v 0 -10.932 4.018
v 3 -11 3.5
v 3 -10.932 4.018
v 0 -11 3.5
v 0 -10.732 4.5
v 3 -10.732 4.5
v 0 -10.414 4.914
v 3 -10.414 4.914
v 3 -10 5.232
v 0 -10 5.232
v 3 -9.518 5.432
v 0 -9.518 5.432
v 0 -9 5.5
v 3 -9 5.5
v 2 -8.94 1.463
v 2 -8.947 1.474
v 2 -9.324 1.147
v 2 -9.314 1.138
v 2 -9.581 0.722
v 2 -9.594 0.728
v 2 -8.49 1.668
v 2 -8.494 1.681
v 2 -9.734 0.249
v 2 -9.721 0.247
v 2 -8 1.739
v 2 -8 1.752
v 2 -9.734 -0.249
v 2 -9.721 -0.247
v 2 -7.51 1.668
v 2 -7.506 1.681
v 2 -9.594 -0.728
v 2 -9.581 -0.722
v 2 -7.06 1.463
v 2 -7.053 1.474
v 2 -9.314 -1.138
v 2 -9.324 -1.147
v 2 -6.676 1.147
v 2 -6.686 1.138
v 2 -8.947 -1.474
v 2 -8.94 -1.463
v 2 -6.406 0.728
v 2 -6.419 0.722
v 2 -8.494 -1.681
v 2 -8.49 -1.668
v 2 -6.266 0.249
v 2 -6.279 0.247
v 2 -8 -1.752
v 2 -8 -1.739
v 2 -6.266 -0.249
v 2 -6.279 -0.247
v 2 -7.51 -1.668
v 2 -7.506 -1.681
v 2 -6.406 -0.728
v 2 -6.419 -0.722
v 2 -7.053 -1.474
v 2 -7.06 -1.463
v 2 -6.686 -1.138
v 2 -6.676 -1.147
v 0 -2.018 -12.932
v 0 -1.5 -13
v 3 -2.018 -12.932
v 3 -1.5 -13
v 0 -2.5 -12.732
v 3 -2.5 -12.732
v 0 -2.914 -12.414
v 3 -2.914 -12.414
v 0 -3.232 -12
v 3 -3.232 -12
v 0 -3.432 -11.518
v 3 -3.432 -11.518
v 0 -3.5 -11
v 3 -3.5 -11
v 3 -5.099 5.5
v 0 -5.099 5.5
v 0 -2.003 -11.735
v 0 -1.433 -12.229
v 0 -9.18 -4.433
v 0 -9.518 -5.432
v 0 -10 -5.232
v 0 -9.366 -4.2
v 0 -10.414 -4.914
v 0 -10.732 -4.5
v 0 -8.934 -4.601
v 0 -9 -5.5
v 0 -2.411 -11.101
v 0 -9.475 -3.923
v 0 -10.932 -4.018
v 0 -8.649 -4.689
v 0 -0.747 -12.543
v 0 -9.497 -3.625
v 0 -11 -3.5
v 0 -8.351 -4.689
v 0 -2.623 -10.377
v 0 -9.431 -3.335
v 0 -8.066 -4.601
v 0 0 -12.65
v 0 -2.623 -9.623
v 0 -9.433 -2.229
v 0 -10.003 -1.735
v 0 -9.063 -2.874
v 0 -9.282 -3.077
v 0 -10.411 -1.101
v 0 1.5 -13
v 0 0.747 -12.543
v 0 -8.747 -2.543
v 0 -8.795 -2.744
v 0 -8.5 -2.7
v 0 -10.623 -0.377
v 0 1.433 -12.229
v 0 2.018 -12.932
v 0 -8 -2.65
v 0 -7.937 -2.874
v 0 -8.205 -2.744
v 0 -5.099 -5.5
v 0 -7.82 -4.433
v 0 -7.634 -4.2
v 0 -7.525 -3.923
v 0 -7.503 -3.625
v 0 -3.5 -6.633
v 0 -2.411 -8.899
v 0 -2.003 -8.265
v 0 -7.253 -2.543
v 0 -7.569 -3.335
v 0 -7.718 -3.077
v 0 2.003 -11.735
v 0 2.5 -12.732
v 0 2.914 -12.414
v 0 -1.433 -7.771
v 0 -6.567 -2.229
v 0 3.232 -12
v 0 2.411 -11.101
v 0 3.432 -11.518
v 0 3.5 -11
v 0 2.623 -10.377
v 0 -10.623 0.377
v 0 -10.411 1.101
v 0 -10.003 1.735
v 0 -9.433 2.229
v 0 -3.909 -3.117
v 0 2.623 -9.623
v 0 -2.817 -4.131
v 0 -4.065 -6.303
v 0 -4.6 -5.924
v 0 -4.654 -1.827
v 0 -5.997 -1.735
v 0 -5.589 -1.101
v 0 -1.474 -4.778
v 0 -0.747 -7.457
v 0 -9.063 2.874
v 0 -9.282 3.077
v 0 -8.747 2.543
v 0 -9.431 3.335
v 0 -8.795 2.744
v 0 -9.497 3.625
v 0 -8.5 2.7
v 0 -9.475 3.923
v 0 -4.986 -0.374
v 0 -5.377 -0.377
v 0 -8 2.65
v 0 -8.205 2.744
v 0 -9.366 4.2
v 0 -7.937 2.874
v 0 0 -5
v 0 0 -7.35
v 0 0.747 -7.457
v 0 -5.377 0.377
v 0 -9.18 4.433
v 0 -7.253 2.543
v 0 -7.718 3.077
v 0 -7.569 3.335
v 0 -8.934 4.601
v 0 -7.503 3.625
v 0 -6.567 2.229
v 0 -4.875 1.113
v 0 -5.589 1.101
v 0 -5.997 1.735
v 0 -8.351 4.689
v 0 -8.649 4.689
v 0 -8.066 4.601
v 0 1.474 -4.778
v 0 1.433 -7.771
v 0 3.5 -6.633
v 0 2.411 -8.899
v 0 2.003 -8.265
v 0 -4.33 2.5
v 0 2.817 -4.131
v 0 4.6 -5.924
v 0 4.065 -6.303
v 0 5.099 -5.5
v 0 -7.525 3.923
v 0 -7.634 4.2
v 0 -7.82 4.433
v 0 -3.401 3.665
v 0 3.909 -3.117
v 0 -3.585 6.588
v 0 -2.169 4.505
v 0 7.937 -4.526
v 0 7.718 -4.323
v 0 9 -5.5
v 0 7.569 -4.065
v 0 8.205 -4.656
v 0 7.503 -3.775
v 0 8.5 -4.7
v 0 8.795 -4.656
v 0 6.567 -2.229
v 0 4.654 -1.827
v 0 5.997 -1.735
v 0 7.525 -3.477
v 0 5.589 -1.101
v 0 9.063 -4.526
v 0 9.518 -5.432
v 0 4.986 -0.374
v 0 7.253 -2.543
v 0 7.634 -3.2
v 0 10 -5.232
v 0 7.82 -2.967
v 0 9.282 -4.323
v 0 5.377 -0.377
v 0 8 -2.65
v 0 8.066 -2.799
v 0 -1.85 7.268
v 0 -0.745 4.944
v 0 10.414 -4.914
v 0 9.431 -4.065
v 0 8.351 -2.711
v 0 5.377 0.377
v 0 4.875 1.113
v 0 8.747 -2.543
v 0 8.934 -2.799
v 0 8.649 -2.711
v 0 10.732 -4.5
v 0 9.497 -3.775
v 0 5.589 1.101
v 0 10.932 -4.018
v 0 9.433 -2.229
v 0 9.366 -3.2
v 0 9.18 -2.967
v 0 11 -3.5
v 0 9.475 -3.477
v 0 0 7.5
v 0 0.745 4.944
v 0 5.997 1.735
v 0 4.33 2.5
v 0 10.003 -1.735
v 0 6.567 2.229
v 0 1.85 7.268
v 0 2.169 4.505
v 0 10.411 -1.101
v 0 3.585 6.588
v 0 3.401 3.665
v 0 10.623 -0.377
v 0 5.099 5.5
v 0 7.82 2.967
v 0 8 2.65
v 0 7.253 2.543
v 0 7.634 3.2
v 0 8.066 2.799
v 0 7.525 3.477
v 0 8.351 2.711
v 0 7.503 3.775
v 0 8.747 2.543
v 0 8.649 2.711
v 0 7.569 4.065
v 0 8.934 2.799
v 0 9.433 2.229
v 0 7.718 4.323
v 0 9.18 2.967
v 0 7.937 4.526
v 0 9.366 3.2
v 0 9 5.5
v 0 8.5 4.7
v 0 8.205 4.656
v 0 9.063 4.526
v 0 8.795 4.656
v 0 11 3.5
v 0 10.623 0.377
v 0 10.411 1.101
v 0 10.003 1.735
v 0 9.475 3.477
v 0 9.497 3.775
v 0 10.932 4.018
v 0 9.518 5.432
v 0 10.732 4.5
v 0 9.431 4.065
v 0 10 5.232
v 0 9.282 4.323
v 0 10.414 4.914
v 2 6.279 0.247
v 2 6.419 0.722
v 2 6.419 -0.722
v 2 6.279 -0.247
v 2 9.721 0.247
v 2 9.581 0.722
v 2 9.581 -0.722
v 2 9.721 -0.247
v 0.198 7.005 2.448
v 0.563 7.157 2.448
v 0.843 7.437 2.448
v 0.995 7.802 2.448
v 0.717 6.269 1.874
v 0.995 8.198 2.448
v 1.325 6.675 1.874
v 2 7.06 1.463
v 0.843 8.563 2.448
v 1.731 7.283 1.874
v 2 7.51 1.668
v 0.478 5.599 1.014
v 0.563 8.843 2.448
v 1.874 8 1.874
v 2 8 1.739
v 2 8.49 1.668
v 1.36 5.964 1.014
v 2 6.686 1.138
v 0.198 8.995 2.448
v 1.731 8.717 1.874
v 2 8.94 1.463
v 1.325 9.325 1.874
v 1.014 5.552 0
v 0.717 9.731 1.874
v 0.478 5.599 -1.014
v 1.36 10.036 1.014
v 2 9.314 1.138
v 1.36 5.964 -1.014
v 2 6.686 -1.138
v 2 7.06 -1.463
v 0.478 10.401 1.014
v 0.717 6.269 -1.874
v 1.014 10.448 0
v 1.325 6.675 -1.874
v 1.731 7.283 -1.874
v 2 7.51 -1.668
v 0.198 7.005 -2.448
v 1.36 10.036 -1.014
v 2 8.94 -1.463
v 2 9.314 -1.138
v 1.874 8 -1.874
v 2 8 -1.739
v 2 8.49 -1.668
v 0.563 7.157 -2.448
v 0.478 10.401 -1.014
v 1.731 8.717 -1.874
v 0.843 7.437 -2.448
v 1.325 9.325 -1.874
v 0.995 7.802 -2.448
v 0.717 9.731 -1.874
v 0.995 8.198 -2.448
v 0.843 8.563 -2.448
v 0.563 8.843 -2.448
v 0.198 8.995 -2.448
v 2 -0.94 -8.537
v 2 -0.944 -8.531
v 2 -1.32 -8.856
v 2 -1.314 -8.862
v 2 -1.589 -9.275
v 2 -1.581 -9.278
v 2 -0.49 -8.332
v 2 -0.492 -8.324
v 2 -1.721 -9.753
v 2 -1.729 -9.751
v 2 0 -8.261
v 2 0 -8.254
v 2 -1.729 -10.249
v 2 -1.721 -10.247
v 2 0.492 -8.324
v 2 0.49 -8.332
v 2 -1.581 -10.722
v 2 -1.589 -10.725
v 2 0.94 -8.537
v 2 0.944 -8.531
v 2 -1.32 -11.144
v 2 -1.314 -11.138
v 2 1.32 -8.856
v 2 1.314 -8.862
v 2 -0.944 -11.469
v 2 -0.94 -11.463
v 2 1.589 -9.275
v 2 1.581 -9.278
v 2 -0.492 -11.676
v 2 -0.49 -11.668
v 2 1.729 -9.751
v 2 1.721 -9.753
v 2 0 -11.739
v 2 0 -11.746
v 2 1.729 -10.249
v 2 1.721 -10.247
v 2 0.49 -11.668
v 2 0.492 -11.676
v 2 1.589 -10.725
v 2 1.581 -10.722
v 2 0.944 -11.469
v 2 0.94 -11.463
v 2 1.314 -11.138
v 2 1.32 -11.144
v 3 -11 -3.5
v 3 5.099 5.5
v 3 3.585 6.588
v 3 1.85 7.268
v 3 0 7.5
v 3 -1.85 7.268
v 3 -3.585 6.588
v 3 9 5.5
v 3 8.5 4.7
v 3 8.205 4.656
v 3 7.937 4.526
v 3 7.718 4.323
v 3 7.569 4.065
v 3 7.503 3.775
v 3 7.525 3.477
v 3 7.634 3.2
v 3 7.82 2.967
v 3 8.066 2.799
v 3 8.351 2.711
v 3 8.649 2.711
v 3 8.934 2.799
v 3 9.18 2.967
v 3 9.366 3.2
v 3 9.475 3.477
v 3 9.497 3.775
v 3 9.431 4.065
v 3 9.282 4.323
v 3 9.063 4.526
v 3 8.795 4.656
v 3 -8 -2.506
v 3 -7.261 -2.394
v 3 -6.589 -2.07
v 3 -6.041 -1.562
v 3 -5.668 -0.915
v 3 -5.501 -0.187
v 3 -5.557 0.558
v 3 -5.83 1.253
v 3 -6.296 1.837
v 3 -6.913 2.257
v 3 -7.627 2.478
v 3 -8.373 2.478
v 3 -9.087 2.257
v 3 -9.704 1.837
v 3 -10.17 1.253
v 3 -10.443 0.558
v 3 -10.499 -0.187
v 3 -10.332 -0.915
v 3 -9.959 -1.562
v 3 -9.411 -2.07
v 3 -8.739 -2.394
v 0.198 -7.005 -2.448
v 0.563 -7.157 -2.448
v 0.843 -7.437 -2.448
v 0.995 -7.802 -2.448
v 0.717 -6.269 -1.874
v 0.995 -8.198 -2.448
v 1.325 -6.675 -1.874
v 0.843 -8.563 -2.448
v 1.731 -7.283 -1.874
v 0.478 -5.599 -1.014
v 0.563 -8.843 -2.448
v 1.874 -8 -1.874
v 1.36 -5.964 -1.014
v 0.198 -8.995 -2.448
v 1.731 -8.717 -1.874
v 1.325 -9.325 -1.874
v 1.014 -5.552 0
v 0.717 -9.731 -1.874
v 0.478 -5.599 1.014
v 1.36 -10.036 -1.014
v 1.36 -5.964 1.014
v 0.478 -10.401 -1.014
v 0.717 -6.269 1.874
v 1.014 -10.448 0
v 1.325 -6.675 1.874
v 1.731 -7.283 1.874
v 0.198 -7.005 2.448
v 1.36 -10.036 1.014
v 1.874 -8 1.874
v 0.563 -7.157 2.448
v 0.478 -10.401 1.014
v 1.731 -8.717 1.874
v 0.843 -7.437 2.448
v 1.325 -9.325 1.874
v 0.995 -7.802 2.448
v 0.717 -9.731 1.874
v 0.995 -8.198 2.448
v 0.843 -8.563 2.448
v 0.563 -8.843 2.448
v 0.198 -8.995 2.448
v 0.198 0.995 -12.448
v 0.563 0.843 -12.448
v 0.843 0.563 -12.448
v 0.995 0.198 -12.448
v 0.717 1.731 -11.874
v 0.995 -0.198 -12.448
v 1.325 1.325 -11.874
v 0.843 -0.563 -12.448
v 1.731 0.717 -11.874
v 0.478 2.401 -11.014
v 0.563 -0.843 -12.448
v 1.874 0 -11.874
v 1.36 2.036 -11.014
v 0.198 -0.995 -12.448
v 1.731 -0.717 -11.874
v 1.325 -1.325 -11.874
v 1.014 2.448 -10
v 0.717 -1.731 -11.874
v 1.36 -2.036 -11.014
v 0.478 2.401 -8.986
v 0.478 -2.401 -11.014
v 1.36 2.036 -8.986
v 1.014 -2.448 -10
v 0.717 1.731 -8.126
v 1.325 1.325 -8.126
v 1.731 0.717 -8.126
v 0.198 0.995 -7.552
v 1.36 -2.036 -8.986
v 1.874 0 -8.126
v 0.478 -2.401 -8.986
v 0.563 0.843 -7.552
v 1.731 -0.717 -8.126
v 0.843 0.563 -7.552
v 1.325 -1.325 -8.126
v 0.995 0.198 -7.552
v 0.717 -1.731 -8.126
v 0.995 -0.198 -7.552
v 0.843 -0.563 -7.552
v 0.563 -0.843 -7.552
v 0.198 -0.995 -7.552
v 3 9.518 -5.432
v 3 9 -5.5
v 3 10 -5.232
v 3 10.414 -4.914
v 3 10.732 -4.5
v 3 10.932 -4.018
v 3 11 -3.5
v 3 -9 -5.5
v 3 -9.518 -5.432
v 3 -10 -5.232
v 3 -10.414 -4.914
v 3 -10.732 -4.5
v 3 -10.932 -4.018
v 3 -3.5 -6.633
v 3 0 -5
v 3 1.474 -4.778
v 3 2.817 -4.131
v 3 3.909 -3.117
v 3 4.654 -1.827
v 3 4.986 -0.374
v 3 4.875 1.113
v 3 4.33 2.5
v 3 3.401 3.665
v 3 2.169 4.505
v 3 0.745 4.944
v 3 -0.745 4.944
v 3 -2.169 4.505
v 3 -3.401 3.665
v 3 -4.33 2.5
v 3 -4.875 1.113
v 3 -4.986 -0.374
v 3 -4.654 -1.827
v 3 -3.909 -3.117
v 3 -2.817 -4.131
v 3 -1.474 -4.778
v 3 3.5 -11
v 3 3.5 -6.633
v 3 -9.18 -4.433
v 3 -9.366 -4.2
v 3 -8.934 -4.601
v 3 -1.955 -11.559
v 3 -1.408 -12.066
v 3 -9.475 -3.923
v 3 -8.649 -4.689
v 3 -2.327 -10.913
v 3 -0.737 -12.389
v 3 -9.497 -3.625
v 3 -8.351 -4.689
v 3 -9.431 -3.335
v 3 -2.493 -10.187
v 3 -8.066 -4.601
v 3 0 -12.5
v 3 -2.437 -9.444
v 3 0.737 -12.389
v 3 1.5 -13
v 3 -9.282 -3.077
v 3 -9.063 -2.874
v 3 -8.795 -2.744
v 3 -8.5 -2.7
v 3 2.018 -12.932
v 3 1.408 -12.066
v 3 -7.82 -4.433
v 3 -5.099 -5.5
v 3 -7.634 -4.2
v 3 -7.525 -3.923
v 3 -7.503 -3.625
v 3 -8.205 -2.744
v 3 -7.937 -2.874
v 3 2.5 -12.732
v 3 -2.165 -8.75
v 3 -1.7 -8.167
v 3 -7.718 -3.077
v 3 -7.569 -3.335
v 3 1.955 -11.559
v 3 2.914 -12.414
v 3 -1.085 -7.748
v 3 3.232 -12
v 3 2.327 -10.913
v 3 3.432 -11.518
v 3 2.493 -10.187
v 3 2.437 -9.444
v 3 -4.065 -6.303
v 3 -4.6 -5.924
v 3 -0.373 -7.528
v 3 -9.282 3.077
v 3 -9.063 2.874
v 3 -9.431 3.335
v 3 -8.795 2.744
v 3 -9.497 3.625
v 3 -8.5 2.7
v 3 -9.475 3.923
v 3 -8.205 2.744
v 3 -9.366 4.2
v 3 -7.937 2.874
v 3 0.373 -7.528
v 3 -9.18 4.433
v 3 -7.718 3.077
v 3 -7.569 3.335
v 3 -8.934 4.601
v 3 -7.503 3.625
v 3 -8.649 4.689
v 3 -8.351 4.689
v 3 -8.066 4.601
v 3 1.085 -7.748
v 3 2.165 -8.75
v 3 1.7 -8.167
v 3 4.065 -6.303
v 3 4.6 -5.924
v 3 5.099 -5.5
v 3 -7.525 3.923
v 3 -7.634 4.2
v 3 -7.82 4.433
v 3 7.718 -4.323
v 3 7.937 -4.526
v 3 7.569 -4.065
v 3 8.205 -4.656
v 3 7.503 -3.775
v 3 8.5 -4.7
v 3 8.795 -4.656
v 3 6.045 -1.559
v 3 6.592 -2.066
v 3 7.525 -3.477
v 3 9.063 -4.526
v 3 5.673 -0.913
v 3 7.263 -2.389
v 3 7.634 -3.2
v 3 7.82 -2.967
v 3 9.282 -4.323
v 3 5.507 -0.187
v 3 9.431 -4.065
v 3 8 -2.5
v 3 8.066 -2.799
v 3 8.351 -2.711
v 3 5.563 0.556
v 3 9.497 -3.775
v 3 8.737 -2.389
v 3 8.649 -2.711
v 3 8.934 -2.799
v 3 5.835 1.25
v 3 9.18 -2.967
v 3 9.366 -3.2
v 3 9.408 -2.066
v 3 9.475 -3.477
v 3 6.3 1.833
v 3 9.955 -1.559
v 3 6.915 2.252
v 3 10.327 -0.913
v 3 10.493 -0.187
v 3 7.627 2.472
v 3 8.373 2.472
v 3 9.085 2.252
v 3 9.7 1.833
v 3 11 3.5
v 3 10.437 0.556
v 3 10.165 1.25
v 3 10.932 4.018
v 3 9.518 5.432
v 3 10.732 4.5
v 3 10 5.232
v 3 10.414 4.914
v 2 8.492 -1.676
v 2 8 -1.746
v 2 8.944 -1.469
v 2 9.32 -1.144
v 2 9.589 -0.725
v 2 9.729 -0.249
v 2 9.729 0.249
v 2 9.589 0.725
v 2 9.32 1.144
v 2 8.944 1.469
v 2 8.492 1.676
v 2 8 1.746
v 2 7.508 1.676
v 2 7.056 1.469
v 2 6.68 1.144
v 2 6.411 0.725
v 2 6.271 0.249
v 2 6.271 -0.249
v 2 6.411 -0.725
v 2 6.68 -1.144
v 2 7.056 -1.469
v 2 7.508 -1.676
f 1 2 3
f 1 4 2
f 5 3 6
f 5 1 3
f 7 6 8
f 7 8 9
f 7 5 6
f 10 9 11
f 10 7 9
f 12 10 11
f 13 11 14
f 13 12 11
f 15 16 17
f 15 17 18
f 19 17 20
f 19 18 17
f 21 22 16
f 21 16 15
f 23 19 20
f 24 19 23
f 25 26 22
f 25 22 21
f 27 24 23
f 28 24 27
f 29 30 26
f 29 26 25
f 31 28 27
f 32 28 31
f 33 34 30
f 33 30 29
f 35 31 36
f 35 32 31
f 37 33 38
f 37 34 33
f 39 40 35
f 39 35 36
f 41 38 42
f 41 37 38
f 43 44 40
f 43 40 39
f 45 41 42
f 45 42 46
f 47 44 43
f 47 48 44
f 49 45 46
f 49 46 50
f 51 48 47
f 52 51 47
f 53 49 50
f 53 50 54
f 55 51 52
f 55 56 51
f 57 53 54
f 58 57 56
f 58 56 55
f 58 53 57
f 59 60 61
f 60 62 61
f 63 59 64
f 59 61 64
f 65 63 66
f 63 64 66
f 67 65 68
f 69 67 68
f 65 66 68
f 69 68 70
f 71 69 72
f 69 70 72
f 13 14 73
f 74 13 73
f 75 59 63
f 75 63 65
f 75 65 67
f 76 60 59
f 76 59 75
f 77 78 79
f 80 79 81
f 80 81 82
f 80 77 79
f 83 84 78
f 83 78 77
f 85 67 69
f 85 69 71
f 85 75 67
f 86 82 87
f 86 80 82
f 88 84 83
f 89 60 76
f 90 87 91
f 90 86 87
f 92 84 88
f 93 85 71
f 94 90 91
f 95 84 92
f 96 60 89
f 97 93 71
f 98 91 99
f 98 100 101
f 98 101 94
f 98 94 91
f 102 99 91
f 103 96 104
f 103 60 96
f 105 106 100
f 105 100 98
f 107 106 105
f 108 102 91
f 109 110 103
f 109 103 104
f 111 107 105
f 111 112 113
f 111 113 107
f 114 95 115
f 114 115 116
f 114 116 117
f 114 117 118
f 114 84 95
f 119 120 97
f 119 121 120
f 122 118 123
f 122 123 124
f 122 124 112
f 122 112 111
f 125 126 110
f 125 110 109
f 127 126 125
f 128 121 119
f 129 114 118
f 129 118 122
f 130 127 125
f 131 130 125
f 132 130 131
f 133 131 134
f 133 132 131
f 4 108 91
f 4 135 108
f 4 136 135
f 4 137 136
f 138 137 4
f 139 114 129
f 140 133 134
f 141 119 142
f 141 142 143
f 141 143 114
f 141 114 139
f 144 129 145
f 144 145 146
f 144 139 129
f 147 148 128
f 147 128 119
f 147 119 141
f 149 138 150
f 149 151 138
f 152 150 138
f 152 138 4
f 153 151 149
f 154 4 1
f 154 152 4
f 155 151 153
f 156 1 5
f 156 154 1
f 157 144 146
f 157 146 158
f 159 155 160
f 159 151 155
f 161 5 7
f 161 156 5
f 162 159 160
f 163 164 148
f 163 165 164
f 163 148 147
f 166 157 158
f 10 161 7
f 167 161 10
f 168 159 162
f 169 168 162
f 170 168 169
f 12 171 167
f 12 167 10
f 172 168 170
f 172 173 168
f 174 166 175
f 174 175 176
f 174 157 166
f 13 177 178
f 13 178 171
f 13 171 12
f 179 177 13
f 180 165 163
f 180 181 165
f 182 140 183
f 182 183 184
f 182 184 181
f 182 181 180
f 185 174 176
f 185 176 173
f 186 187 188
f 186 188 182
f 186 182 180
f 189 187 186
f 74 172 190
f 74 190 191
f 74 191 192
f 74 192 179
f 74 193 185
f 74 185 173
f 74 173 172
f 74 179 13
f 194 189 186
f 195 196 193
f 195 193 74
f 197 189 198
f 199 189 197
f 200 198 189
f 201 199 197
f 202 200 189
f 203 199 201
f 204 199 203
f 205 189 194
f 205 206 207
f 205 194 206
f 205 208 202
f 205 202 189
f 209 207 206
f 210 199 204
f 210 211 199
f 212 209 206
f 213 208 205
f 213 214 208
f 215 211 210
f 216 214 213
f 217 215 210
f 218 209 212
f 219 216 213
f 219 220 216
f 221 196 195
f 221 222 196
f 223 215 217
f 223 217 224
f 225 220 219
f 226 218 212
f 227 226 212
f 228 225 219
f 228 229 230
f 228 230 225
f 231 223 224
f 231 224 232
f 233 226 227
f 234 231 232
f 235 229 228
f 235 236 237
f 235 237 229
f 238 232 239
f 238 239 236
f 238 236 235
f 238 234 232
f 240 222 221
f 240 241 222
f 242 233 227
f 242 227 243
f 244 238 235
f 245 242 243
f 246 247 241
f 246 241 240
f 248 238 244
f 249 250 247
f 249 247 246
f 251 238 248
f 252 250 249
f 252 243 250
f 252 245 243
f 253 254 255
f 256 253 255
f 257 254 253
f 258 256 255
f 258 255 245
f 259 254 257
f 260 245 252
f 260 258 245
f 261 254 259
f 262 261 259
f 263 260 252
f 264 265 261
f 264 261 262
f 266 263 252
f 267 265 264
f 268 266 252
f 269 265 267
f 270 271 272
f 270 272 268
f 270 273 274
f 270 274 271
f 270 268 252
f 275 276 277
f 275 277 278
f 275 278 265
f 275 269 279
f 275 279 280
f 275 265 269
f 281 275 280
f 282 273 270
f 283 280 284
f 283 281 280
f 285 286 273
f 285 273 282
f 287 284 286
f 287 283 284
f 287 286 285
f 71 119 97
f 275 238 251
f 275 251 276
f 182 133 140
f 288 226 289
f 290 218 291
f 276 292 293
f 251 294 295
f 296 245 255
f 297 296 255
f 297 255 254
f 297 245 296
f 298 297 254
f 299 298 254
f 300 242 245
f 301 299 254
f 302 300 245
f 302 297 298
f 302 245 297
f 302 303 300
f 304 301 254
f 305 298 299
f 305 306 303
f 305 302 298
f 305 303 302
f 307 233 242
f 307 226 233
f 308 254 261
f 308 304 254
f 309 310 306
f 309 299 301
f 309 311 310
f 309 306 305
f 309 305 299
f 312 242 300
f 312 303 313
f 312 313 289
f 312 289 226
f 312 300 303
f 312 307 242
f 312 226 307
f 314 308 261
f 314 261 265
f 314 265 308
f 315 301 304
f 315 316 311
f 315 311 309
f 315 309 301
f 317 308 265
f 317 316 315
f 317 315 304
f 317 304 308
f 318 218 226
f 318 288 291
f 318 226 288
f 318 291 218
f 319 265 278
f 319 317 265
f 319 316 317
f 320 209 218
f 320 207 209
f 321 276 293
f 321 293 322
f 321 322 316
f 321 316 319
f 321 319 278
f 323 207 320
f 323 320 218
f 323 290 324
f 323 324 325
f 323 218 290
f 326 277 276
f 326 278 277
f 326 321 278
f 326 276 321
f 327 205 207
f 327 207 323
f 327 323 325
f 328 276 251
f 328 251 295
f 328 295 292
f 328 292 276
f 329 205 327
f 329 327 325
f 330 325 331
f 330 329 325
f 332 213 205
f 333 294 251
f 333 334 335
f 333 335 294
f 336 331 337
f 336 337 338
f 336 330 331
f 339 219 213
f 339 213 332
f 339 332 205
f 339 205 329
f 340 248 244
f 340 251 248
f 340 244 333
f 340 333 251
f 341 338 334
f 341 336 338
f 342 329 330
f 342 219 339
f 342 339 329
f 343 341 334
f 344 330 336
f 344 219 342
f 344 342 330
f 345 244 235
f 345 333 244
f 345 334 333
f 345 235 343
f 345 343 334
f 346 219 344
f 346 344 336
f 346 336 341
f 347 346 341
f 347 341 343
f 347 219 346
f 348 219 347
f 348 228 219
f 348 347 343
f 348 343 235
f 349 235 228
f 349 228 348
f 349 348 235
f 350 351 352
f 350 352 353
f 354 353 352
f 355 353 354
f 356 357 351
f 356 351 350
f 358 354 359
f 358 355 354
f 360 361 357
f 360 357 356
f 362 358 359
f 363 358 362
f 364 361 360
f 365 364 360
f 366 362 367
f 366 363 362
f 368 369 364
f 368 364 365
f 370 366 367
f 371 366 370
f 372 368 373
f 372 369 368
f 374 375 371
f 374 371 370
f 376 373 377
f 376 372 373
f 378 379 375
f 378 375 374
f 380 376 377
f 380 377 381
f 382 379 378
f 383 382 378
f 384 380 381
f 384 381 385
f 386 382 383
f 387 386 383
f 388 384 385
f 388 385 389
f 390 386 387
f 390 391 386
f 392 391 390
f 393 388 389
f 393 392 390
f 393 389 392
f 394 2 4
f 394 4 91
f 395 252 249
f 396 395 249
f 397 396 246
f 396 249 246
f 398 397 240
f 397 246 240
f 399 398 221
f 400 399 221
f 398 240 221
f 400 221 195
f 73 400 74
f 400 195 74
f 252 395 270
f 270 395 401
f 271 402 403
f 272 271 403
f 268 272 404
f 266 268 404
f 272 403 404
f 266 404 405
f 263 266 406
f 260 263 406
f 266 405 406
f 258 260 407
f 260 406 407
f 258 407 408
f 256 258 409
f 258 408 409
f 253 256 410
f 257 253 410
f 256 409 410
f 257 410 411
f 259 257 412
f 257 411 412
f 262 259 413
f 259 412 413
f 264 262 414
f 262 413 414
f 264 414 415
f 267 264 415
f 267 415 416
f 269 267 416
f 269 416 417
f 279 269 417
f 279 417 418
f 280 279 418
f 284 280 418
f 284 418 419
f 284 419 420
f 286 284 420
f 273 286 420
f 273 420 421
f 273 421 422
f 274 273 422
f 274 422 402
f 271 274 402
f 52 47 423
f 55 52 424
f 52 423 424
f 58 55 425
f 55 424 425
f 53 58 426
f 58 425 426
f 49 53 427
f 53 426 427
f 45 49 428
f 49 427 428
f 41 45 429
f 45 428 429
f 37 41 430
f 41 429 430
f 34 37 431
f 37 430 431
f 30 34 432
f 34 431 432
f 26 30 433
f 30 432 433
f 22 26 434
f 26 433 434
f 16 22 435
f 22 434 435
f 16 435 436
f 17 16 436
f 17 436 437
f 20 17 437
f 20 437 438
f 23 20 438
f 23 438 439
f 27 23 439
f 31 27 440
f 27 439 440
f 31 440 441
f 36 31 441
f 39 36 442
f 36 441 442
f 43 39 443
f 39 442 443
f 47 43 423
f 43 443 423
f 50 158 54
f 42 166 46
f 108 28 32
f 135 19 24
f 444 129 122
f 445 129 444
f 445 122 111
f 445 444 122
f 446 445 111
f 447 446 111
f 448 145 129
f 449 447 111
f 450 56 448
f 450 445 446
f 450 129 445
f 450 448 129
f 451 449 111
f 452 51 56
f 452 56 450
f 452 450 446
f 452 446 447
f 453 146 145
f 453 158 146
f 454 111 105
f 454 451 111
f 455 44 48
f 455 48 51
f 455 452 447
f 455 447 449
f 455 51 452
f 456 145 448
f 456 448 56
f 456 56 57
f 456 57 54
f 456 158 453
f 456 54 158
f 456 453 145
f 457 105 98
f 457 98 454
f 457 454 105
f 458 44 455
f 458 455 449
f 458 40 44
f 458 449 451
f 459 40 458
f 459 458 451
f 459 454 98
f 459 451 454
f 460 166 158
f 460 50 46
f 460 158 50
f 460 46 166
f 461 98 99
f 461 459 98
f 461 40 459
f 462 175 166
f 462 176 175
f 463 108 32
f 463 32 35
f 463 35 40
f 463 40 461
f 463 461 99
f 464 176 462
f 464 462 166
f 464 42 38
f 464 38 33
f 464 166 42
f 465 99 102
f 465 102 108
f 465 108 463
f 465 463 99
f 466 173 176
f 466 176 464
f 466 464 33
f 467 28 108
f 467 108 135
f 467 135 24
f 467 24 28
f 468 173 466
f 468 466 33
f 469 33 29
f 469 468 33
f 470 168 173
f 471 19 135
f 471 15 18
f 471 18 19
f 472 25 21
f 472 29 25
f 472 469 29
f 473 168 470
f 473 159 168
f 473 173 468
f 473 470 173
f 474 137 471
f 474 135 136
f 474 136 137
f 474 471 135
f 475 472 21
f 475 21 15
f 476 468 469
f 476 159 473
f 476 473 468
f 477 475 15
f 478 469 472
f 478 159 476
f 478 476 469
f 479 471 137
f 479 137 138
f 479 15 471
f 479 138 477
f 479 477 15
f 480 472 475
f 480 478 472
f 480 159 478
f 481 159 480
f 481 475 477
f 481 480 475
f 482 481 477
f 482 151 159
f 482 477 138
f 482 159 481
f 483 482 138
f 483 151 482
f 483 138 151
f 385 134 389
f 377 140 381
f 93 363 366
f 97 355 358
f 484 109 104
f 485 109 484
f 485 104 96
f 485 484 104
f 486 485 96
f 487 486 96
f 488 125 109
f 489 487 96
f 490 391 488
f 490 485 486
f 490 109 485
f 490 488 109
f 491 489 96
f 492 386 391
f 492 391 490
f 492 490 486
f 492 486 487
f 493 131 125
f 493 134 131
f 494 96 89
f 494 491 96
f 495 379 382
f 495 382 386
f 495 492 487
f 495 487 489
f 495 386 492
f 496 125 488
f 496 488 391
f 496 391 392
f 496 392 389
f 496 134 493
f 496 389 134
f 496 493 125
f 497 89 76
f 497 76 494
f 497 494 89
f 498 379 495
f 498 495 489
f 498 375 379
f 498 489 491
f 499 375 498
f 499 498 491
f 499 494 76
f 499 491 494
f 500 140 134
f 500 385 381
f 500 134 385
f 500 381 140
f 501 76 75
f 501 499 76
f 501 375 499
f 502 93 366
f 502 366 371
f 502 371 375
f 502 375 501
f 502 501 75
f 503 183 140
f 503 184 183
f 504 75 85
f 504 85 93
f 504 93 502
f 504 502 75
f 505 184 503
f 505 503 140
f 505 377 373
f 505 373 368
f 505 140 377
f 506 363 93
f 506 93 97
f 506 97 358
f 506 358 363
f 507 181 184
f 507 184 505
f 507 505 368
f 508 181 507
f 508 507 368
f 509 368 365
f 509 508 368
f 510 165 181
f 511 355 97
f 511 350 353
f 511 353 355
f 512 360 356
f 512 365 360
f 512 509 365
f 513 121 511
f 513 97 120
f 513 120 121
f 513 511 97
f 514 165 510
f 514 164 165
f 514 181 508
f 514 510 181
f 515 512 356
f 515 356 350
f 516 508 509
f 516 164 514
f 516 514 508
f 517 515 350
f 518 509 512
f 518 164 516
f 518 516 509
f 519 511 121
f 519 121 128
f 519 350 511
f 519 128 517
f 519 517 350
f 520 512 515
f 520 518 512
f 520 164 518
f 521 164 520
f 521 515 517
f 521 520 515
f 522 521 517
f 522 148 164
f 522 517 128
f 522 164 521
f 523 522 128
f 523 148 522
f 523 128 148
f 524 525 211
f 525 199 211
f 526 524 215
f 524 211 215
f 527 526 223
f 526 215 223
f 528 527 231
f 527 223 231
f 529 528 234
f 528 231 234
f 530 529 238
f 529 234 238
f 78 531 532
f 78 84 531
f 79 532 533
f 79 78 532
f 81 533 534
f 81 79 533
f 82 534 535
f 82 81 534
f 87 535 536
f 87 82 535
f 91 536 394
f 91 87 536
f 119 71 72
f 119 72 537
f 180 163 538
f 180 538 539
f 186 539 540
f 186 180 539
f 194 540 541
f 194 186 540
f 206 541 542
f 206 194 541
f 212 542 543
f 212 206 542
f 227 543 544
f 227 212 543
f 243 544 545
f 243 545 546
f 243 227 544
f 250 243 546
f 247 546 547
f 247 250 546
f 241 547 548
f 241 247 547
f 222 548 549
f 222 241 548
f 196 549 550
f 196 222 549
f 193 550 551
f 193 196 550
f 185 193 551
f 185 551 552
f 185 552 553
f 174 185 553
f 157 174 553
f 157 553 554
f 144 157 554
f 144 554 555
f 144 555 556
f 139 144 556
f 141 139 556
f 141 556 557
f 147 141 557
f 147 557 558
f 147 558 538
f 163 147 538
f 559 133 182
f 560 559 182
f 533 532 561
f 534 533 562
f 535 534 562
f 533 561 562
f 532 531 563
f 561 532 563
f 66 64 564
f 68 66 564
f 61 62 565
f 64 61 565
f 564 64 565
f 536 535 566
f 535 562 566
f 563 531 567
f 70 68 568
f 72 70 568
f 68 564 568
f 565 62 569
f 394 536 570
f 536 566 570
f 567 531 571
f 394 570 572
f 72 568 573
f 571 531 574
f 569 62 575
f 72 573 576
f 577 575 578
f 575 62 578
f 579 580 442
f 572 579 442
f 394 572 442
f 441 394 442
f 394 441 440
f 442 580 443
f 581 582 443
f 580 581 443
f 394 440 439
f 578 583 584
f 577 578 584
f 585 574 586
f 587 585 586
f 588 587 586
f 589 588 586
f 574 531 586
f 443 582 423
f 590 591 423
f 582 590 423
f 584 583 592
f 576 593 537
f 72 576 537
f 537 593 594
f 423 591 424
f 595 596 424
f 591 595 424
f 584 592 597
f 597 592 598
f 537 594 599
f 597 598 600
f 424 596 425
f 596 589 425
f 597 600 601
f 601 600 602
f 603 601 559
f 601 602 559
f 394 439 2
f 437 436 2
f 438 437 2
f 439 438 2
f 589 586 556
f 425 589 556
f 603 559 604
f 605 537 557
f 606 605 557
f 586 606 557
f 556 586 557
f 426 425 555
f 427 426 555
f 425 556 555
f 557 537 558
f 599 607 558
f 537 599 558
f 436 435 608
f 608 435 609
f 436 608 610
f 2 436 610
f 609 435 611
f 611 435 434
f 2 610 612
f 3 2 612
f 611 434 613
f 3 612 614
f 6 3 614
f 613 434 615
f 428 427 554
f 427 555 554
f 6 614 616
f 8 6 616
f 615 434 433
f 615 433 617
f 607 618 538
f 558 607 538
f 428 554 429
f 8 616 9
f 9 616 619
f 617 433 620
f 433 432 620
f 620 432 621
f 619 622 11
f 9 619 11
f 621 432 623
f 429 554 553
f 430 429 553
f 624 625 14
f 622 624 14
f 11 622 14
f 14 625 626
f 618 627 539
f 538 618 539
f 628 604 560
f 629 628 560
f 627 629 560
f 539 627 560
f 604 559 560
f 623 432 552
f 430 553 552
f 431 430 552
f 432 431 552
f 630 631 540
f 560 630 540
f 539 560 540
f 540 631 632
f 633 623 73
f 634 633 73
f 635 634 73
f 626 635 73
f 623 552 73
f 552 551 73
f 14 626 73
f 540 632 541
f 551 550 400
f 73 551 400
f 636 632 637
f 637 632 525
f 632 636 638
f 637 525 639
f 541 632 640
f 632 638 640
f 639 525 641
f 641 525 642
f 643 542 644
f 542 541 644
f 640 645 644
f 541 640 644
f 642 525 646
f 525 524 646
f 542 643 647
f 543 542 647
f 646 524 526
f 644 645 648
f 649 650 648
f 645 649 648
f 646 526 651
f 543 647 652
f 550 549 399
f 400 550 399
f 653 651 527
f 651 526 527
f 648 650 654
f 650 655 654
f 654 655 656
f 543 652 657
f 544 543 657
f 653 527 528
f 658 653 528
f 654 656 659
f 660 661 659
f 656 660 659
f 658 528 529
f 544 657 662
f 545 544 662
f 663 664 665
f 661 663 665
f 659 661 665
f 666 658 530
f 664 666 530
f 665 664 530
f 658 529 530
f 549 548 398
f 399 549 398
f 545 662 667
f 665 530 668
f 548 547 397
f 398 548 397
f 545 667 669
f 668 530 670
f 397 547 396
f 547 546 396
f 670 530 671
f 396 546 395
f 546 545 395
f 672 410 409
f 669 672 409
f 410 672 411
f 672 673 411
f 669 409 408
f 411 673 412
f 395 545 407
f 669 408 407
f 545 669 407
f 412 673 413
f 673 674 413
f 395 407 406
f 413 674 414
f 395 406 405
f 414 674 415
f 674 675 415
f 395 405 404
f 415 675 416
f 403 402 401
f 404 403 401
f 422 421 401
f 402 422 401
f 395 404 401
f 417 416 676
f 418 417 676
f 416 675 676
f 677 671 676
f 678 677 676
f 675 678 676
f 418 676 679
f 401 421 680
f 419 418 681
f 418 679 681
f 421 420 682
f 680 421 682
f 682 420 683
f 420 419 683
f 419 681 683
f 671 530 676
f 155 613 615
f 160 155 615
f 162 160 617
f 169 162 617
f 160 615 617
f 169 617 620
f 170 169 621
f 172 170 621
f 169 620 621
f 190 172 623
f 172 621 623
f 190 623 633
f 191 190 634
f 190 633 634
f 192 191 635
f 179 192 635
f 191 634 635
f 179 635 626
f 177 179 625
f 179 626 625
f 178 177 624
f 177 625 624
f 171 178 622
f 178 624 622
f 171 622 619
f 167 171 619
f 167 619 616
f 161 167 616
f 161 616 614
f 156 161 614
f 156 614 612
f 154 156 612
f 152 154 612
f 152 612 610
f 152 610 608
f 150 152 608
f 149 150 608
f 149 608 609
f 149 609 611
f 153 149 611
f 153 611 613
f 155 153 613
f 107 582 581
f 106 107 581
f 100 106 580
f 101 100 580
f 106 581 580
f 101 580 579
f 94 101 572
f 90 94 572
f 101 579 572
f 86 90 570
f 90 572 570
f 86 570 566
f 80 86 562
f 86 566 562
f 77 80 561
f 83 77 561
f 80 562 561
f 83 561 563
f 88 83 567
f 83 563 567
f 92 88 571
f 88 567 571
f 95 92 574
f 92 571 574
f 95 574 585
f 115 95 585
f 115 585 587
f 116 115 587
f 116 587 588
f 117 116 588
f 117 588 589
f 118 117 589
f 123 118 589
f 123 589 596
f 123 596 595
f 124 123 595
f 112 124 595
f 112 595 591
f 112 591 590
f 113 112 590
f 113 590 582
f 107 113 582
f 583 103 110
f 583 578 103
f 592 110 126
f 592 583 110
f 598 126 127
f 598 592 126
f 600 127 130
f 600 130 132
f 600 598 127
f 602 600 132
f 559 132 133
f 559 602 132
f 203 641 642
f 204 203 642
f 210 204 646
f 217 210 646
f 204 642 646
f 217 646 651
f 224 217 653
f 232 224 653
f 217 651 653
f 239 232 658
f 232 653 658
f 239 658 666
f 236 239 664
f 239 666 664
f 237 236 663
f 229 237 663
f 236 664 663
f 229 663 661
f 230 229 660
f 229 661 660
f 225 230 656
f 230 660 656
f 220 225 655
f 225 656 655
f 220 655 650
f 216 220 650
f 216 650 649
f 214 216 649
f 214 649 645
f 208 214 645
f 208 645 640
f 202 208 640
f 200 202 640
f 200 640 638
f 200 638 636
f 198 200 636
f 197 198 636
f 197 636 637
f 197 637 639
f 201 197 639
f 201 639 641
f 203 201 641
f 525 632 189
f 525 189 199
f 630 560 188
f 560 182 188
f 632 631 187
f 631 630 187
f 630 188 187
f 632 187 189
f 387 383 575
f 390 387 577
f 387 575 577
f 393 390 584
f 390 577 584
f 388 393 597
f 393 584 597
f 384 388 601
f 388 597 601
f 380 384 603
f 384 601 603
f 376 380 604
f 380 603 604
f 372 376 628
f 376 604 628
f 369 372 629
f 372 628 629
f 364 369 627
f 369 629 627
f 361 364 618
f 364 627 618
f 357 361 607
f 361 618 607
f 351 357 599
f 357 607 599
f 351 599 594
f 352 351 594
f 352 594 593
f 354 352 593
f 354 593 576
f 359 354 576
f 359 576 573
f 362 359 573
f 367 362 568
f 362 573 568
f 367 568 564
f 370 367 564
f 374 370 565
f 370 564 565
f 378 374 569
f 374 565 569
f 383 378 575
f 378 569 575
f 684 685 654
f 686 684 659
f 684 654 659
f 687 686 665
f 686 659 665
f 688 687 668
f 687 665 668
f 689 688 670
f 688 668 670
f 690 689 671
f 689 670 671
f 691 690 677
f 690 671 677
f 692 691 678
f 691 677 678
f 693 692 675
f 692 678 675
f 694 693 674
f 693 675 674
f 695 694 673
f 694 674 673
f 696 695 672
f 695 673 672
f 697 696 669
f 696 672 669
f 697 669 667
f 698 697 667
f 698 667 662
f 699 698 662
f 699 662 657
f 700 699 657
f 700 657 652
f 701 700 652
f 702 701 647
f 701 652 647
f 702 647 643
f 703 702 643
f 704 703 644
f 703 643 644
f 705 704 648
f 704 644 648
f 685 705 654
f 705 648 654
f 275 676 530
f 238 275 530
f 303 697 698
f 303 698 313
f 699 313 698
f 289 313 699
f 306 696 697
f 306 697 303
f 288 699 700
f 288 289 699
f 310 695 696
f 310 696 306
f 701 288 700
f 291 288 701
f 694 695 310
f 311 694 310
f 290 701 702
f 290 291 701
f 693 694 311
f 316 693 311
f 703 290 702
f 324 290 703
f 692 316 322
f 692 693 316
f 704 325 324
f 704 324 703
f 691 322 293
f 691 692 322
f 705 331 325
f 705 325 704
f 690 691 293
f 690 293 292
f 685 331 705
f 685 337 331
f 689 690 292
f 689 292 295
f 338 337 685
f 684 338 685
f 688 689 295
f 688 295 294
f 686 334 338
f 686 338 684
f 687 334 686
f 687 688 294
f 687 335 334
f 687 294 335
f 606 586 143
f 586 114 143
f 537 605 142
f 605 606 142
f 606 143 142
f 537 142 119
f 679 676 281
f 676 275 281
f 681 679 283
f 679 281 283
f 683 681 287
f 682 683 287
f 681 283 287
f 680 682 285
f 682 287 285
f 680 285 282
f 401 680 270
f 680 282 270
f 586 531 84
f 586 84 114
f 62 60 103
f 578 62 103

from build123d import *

# Parameters (mm, degrees)
SKETCH_1_R                    = 7.5
SKETCH_1_R_2                  = 5
EXTRUDE_1_DEPTH               = 3
SKETCH_2_W                    = 11
SKETCH_2_H                    = 6
EXTRUDE_2_DEPTH               = 3
SKETCH_5_R                    = 2.5
CUT_EXTRUDE_1_DEPTH           = 1
CUT_EXTRUDE_1_DRAFT           = -37
SKETCH_5_R_2                  = 2.505592327
CUT_EXTRUDE_1_PROFILE_2_DEPTH = 1
CUT_EXTRUDE_1_PROFILE_2_DRAFT = -37
FILLET_2_R                    = 2
SKETCH_7_R                    = 1
CUT_EXTRUDE_3_DEPTH           = 14.647344064
SKETCH_8_W                    = 7.5
SKETCH_8_H                    = 7
EXTRUDE_3_DEPTH               = 3
SKETCH_10_R                   = 2.5
CUT_EXTRUDE_4_DEPTH           = 1
CUT_EXTRUDE_4_DRAFT           = -37
FILLET_3_R                    = 2


with BuildPart() as part:
    # 草图1 → 凸台-拉伸1 (new body)
    with BuildSketch(Plane(origin=(0, 0, 0), x_dir=(0, 0, -1), z_dir=(1, 0, 0))):
        Circle(SKETCH_1_R)
        Circle(SKETCH_1_R_2, mode=Mode.SUBTRACT)
    extrude(amount=EXTRUDE_1_DEPTH)

    # 草图2 → 凸台-拉伸2 (add)
    with BuildSketch(Plane(origin=(3, 0, 0), x_dir=(0, 0, -1), z_dir=(1, 0, 0))):
        with Locations((0, 8)):
            Rectangle(SKETCH_2_W, SKETCH_2_H)
        with Locations((0, -8)):
            Rectangle(SKETCH_2_W, SKETCH_2_H)
    extrude(amount=-EXTRUDE_2_DEPTH)

    # 草图3 → 切除-旋转1 (revolve, cut)
    with BuildSketch(Plane.ZY):
        with BuildLine():
            Line((-2.65, 8), (2.65, 8))
            ThreePointArc((2.65, 8), (0, 5.35), (-2.65, 8))
        make_face()
    revolve(axis=Axis((0, 8, -2.65), (0, 0, 1)), mode=Mode.SUBTRACT)

    # 草图4 → 切除-旋转2 (revolve, cut)
    with BuildSketch(Plane.ZY):
        with BuildLine():
            Line((2.65, -8), (-2.65, -8))
            ThreePointArc((-2.65, -8), (0, -10.65), (2.65, -8))
        make_face()
    revolve(axis=Axis((0, -8, 2.65), (0, 0, -1)), mode=Mode.SUBTRACT)


with BuildPart() as cut_extrude_1_tool:
    # 草图5 → 切除-拉伸1 (with draft: the straight prism first)
    with BuildSketch(Plane(origin=(3, 0, 0), x_dir=(0, 0, -1), z_dir=(1, 0, 0))):
        with Locations((0, 8)):
            Circle(SKETCH_5_R)
    extrude(amount=-CUT_EXTRUDE_1_DEPTH)
    # 切除-拉伸1: the draft: its side faces are tilted about the plane it starts from
    cut_extrude_1_sides = [cut_extrude_1_tool.faces().sort_by_distance(p)[0] for p in [
        (2.5, 8, 2.5),
    ]]
    draft(cut_extrude_1_sides, Plane(origin=(3, 0, 0), x_dir=(0, 0, -1), z_dir=(1, 0, 0)), CUT_EXTRUDE_1_DRAFT)


with BuildPart() as part_1:
    add(part.part)

    # 切除-拉伸1: cut by cut_extrude_1_tool
    add(cut_extrude_1_tool.part, mode=Mode.SUBTRACT)


with BuildPart() as cut_extrude_1_profile_2_tool:
    # 草图5 → 切除-拉伸1 profile 2 (with draft: the straight prism first)
    with BuildSketch(Plane(origin=(3, 0, 0), x_dir=(0, 0, -1), z_dir=(1, 0, 0))):
        with Locations((0, -8)):
            Circle(SKETCH_5_R_2)
    extrude(amount=-CUT_EXTRUDE_1_PROFILE_2_DEPTH)
    # 切除-拉伸1 profile 2: the draft: its side faces are tilted about the plane it starts from
    cut_extrude_1_profile_2_sides = [cut_extrude_1_profile_2_tool.faces().sort_by_distance(p)[0] for p in [
        (2.5, -8, 2.505592327),
    ]]
    draft(cut_extrude_1_profile_2_sides, Plane(origin=(3, 0, 0), x_dir=(0, 0, -1), z_dir=(1, 0, 0)), CUT_EXTRUDE_1_PROFILE_2_DRAFT)


with BuildPart() as part_2:
    add(part_1.part)

    # 切除-拉伸1 profile 2: cut by cut_extrude_1_profile_2_tool
    add(cut_extrude_1_profile_2_tool.part, mode=Mode.SUBTRACT)

    # 圆角2
    fillet_2_edges = [part_2.edges().sort_by_distance(p)[0] for p in [
        (1.5, 11, -5.5),
        (1.5, 11, 5.5),
        (1.5, -11, 5.5),
        (1.5, -11, -5.5),
    ]]
    fillet(fillet_2_edges, radius=FILLET_2_R)

    # 草图7 → 切除-拉伸3 (cut, through all)
    with BuildSketch(Plane(origin=(3, 0, 0), x_dir=(0, 0, -1), z_dir=(1, 0, 0))):
        with Locations((-3.7, -8.5)):
            Circle(SKETCH_7_R)
        with Locations(Location((3.7, -8.5, 0), (0, 0, 180))):
            Circle(SKETCH_7_R)
        with Locations((3.7, 8.5)):
            Circle(SKETCH_7_R)
        with Locations(Location((-3.7, 8.5, 0), (0, 0, 180))):
            Circle(SKETCH_7_R)
    extrude(amount=-CUT_EXTRUDE_3_DEPTH, mode=Mode.SUBTRACT)

    # 草图8 → 凸台-拉伸3 (add)
    with BuildSketch(Plane.ZY):
        with Locations((-9.25, 0)):
            Rectangle(SKETCH_8_W, SKETCH_8_H)
    extrude(amount=-EXTRUDE_3_DEPTH)

    # 草图9 → 切除-旋转3 (revolve, cut)
    with BuildSketch(Plane.ZY):
        with BuildLine():
            Line((-7.35, 0), (-12.65, 0))
            ThreePointArc((-12.65, 0), (-10, 2.65), (-7.35, 0))
        make_face()
    revolve(axis=Axis((0, 0, -7.35), (0, 0, -1)), mode=Mode.SUBTRACT)


with BuildPart() as cut_extrude_4_tool:
    # 草图10 → 切除-拉伸4 (with draft: the straight prism first)
    with BuildSketch(Plane(origin=(3, 0, 0), x_dir=(0, 0, -1), z_dir=(1, 0, 0))):
        with Locations((10, 0)):
            Circle(SKETCH_10_R)
    extrude(amount=-CUT_EXTRUDE_4_DEPTH)
    # 切除-拉伸4: the draft: its side faces are tilted about the plane it starts from
    cut_extrude_4_sides = [cut_extrude_4_tool.faces().sort_by_distance(p)[0] for p in [
        (2.5, 0, -7.5),
    ]]
    draft(cut_extrude_4_sides, Plane(origin=(3, 0, 0), x_dir=(0, 0, -1), z_dir=(1, 0, 0)), CUT_EXTRUDE_4_DRAFT)


with BuildPart() as part_3:
    add(part_2.part)

    # 切除-拉伸4: cut by cut_extrude_4_tool
    add(cut_extrude_4_tool.part, mode=Mode.SUBTRACT)

    # 圆角3
    fillet_3_edges = [part_3.edges().sort_by_distance(p)[0] for p in [
        (1.5, 3.5, -13),
        (1.5, -3.5, -13),
    ]]
    fillet(fillet_3_edges, radius=FILLET_3_R)


solid = part_3.part
